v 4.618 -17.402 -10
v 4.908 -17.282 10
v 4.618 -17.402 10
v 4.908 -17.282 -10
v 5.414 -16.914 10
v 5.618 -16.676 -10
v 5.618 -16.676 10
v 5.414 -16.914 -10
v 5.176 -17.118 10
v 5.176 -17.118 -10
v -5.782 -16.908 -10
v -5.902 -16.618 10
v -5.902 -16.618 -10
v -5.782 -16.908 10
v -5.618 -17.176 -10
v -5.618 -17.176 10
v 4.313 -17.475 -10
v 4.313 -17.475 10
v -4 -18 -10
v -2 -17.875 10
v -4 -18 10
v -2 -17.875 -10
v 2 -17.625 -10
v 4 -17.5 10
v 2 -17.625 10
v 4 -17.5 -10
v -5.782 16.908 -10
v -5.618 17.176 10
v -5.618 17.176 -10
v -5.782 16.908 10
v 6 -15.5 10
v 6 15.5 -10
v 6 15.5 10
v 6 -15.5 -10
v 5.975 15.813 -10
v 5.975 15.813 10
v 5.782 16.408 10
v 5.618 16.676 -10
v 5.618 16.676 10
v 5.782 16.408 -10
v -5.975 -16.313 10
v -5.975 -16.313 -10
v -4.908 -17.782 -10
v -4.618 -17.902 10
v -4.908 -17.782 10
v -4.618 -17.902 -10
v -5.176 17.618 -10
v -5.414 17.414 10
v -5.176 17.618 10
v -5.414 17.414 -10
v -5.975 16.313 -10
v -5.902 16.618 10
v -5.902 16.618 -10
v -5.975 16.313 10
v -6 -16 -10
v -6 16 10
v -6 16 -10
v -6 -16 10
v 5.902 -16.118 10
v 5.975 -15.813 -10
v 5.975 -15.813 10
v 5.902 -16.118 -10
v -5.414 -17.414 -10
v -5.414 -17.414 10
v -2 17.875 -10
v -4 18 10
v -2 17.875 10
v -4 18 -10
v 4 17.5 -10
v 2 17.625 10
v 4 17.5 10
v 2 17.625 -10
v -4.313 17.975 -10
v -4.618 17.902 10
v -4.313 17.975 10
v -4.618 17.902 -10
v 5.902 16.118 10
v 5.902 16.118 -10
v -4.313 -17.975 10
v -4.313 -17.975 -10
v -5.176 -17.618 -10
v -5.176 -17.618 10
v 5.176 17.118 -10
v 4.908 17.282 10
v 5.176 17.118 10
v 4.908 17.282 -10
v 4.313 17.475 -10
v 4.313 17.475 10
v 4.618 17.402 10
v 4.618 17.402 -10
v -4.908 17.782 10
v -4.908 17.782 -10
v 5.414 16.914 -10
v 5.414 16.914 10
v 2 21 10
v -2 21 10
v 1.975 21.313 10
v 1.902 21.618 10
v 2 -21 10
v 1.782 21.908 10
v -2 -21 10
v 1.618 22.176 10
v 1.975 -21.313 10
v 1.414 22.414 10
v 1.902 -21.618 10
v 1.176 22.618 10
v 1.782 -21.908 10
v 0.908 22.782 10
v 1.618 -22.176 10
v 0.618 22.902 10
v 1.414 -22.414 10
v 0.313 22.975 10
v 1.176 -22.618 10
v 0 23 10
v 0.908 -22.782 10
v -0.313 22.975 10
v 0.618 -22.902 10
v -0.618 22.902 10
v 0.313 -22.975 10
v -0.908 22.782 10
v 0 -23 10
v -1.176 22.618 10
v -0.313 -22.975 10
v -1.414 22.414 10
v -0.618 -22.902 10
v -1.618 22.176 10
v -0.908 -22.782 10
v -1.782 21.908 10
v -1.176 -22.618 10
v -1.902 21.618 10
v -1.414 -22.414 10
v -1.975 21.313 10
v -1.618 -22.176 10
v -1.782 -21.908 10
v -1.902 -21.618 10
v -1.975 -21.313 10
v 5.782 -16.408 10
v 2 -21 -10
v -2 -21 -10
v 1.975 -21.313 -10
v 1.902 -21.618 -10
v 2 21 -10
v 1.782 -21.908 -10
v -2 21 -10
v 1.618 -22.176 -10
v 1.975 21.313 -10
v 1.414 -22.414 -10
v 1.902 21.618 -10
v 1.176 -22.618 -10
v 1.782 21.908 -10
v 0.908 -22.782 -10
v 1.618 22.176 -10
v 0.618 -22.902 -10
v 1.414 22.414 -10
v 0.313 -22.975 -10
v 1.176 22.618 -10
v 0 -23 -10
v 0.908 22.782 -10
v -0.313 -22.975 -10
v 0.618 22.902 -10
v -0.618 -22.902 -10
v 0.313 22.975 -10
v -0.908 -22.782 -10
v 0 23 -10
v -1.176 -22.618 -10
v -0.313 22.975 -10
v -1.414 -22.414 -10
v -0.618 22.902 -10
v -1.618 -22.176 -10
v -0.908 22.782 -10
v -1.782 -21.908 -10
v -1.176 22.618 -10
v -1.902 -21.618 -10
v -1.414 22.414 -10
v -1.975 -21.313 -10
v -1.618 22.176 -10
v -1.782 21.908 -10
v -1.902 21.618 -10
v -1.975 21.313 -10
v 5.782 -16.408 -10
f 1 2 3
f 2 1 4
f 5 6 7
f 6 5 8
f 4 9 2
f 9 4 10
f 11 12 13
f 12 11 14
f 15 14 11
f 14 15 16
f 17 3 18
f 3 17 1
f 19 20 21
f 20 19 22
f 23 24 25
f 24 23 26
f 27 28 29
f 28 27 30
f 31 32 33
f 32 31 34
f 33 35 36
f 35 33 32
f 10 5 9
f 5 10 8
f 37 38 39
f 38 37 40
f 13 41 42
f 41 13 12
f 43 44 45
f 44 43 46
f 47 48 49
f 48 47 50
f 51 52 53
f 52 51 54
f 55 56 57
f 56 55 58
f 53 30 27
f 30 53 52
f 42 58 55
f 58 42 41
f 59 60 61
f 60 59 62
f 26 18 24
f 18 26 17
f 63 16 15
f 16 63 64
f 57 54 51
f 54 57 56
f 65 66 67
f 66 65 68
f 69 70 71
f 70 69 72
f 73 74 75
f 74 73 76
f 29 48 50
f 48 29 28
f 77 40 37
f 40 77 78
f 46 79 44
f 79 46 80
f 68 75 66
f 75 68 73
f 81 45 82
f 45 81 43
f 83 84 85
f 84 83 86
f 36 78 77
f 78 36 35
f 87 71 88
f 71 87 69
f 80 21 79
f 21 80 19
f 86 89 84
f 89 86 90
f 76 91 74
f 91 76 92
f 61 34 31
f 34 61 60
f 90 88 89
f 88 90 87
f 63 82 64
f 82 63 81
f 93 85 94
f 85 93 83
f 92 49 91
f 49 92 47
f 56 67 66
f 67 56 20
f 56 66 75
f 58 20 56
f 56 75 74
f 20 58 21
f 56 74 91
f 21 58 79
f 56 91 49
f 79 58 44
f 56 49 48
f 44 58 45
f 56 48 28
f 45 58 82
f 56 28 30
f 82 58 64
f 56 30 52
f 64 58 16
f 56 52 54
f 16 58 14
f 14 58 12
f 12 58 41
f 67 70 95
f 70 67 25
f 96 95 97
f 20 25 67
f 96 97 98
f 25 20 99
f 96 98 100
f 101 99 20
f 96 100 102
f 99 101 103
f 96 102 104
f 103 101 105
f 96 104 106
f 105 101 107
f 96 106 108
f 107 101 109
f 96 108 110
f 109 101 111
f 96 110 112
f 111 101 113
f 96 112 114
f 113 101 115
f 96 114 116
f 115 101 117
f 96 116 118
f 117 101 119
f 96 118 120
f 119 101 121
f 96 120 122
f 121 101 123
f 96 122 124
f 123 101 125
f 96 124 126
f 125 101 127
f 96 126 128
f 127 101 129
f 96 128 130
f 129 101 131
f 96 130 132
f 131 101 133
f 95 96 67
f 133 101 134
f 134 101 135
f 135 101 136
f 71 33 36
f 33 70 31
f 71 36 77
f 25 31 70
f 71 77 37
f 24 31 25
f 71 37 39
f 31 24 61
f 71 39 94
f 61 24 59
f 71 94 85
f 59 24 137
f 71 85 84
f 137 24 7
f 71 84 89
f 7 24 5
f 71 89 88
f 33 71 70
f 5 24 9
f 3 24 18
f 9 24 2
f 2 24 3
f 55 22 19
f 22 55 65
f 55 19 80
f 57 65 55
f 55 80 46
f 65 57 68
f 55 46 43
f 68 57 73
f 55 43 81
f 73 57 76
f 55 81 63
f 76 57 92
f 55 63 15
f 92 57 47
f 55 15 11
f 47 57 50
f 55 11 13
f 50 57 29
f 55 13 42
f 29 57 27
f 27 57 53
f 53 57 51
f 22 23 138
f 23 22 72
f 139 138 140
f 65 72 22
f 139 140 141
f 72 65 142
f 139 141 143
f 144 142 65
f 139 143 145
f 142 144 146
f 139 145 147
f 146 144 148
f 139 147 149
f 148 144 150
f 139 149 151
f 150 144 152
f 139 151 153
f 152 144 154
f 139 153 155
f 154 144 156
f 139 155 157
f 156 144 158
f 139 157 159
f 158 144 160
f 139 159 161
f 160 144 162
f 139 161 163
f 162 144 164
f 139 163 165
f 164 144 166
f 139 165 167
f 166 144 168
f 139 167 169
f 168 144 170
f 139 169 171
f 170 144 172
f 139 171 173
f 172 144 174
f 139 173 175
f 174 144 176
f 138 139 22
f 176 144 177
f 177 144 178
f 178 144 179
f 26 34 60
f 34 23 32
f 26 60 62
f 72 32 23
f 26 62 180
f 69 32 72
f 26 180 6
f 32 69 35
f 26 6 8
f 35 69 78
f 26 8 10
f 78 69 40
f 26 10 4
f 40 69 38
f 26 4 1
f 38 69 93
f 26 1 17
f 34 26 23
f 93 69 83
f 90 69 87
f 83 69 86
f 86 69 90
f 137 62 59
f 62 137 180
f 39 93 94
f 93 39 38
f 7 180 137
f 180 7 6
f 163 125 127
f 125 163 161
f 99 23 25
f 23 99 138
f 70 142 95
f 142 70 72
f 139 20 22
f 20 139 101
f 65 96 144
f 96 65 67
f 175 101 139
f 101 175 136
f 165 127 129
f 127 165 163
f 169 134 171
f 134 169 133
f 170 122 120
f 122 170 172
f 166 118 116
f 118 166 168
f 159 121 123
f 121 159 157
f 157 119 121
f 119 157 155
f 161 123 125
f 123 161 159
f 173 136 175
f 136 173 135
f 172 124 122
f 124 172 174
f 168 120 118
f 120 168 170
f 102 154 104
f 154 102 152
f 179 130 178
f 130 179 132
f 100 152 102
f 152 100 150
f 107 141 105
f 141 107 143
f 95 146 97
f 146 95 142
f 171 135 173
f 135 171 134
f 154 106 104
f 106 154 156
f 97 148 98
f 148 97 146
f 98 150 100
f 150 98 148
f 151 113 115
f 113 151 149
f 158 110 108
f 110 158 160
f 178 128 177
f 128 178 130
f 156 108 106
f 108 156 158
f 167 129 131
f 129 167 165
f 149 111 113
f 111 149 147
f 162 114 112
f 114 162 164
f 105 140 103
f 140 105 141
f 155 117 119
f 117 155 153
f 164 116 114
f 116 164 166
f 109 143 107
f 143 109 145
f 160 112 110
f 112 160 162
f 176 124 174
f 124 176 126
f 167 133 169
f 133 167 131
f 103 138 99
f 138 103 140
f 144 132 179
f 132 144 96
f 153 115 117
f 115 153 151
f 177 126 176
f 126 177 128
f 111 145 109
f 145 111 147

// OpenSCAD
// preview[view:north east, tilt:top]

//%translate([12.5,-35,0])
//	rotate([0,0,90])
//	import("C:\\misc\\db25_cutout.stl");

/* [Cutout] */

// Type of cut out
dbType = "DB15"; //[DB09, VGA, DB15, DB25]

// Screw hole type
ScrewHoleType = "SLOT"; //[HOLE, SLOT, BigSlot]

// Cutout Heigth
CutoutHeight = 20; //[1:50]

/* [Options] */

// Genrate Cutout
GenerateDbCutout = "Yes"; //[Yes, No]

// Tiedown Support Pins. Normaly you will want to generate these seperate from the cutout.
GenerateSupportPins = "No"; //[Yes, No]

// Tie Down straps. Normaly you will generate these on there own.
GenerateTieDownSraps = "No"; //[Yes, No]

cutoutDB(dbType, ScrewHoleType, GenerateDbCutout, GenerateSupportPins);

/* [About] */
// This is meant to be a library for DB and DE connectors. If you have any sugestion feel free to send me a message.
About = ""; //[]





/* [Hidden] */

$fn=40;


//
// inType DB09,15,25,VGA
//
// inScrewHoleType HOLE, SLOT
//



/*
cutoutDB09vga("SLOT");
translate([15,0,0]) cutoutDB09vga("HOLE");

translate([30,0,0]) cutoutDB15("SLOT");
translate([45,0,0]) cutoutDB15("HOLE");

translate([60,0,0]) cutoutDB25("SLOT");
translate([75,0,0]) cutoutDB25("HOLE");

*/

if(GenerateTieDownSraps == "Yes"){
	holdDownStraps();
}
module cutoutDB(inType, inScrewHoleType, wGenerateDbCutout, wGenerateSupportPins){
	
	//wGenerateDbCutout = "" ? "Yes" : "No" ;
	//wGenerateSupportPins = "" ? "No" : "Yes" ;
	
	if(inType == "DB09" || inType == "VGA"){
		cutoutDB09vga(inScrewHoleType, wGenerateDbCutout, wGenerateSupportPins);
	} else if(inType == "DB15"){
		cutoutDB15(inScrewHoleType, wGenerateDbCutout, wGenerateSupportPins);
	} else if(inType == "DB25"){
		cutoutDB25(inScrewHoleType, wGenerateDbCutout, wGenerateSupportPins);
	}
}

module cutoutDB09vga(inScreewHoleType, wGenerateDbCutout, wGenerateSupportPins){
	holeWidth = 8.2;
	HoleHeight = 4;	
	cutoutDBx(holeWidth, HoleHeight, inScreewHoleType, wGenerateDbCutout, wGenerateSupportPins);
}
module cutoutDB15(inScreewHoleType, wGenerateDbCutout, wGenerateSupportPins){
	holeWidth = 16;
	HoleHeight = 4;	
	cutoutDBx(holeWidth, HoleHeight, inScreewHoleType, wGenerateDbCutout, wGenerateSupportPins);
}
module cutoutDB25(inScreewHoleType, wGenerateDbCutout, wGenerateSupportPins){
	holeWidth = 19.6;
	HoleHeight = 4;	
	cutoutDBx(holeWidth, HoleHeight, inScreewHoleType, wGenerateDbCutout, wGenerateSupportPins);
}
module cutoutDBx(inHoleWidth, inHoleHeight, inScreewHoleType, wGenerateDbCutout, wGenerateSupportPins){
	screwHoleWidth = inHoleWidth + 5;
	if(wGenerateDbCutout == "Yes"){
		hull(){
			translate([-inHoleHeight, inHoleWidth,  		0]) cylinder(h = CutoutHeight, d = 4, center = true); // upper right
			translate([-inHoleHeight, -inHoleWidth, 		0]) cylinder(h = CutoutHeight, d = 4, center = true); // upper left
			translate([inHoleHeight,  inHoleWidth  -.5, 0]) cylinder(h = CutoutHeight, d = 4, center = true); // lower right
			translate([inHoleHeight,  -inHoleWidth +.5, 0]) cylinder(h = CutoutHeight, d = 4, center = true); // lower left
		}
		holeDiamiter = 4;
		if(inScreewHoleType == "HOLE"){
			translate([0,  screwHoleWidth,0]) cylinder(h = CutoutHeight, d = holeDiamiter, center = true);
			translate([0, -screwHoleWidth,0]) cylinder(h = CutoutHeight, d = holeDiamiter, center = true);
		} else if(inScreewHoleType == "SLOT"){
			holeDiamiter = 4 ;
			hull(){
				translate([0,  screwHoleWidth,0]) cylinder(h = CutoutHeight, d = holeDiamiter, center = true);
				translate([0, -screwHoleWidth,0]) cylinder(h = CutoutHeight, d = holeDiamiter, center = true);
			}
		}	else {
			holeDiamiter = 6 ;
			hull(){
				translate([0,  screwHoleWidth,0]) cylinder(h = CutoutHeight, d = holeDiamiter, center = true);
				translate([0, -screwHoleWidth,0]) cylinder(h = CutoutHeight, d = holeDiamiter, center = true);
			}	
		}
	}
	placeSupportPins(screwHoleWidth, wGenerateSupportPins);
}
module placeSupportPins(screwHoleWidth, wGenerateSupportPins){
	if(wGenerateSupportPins == "Yes" ){
		translate([12,screwHoleWidth,0]) supportPins();
		translate([12,-screwHoleWidth,0]) supportPins();
		translate([-12,screwHoleWidth,0]) supportPins();
		translate([-12,-screwHoleWidth,0]) supportPins();
	}
}
module supportPins(){
		difference(){
			hull(){
				cube([8,12,.1], center=true);
				translate([0,0,3]) cube([5,5,.1], center=true);
			}
			translate([0,0,4]) cylinder(h = 4, d = 2, center = true);
		}
}

module holdDownStraps(){
	translate([0,-5,0]) rotate([90,0,0]) holdDownStrap();
	translate([0,+5,0]) rotate([90,0,0]) holdDownStrap();
}

module holdDownStrap(){
	difference(){
		cube([34,5,2], center=true);
		translate([12,0,0]) cylinder(h = 6, d = 2, center = true);
		translate([-12,0,0]) cylinder(h = 6, d = 2, center = true);
	}
}

translate([15,0,0]) cutoutDB09vga("HOLE");
